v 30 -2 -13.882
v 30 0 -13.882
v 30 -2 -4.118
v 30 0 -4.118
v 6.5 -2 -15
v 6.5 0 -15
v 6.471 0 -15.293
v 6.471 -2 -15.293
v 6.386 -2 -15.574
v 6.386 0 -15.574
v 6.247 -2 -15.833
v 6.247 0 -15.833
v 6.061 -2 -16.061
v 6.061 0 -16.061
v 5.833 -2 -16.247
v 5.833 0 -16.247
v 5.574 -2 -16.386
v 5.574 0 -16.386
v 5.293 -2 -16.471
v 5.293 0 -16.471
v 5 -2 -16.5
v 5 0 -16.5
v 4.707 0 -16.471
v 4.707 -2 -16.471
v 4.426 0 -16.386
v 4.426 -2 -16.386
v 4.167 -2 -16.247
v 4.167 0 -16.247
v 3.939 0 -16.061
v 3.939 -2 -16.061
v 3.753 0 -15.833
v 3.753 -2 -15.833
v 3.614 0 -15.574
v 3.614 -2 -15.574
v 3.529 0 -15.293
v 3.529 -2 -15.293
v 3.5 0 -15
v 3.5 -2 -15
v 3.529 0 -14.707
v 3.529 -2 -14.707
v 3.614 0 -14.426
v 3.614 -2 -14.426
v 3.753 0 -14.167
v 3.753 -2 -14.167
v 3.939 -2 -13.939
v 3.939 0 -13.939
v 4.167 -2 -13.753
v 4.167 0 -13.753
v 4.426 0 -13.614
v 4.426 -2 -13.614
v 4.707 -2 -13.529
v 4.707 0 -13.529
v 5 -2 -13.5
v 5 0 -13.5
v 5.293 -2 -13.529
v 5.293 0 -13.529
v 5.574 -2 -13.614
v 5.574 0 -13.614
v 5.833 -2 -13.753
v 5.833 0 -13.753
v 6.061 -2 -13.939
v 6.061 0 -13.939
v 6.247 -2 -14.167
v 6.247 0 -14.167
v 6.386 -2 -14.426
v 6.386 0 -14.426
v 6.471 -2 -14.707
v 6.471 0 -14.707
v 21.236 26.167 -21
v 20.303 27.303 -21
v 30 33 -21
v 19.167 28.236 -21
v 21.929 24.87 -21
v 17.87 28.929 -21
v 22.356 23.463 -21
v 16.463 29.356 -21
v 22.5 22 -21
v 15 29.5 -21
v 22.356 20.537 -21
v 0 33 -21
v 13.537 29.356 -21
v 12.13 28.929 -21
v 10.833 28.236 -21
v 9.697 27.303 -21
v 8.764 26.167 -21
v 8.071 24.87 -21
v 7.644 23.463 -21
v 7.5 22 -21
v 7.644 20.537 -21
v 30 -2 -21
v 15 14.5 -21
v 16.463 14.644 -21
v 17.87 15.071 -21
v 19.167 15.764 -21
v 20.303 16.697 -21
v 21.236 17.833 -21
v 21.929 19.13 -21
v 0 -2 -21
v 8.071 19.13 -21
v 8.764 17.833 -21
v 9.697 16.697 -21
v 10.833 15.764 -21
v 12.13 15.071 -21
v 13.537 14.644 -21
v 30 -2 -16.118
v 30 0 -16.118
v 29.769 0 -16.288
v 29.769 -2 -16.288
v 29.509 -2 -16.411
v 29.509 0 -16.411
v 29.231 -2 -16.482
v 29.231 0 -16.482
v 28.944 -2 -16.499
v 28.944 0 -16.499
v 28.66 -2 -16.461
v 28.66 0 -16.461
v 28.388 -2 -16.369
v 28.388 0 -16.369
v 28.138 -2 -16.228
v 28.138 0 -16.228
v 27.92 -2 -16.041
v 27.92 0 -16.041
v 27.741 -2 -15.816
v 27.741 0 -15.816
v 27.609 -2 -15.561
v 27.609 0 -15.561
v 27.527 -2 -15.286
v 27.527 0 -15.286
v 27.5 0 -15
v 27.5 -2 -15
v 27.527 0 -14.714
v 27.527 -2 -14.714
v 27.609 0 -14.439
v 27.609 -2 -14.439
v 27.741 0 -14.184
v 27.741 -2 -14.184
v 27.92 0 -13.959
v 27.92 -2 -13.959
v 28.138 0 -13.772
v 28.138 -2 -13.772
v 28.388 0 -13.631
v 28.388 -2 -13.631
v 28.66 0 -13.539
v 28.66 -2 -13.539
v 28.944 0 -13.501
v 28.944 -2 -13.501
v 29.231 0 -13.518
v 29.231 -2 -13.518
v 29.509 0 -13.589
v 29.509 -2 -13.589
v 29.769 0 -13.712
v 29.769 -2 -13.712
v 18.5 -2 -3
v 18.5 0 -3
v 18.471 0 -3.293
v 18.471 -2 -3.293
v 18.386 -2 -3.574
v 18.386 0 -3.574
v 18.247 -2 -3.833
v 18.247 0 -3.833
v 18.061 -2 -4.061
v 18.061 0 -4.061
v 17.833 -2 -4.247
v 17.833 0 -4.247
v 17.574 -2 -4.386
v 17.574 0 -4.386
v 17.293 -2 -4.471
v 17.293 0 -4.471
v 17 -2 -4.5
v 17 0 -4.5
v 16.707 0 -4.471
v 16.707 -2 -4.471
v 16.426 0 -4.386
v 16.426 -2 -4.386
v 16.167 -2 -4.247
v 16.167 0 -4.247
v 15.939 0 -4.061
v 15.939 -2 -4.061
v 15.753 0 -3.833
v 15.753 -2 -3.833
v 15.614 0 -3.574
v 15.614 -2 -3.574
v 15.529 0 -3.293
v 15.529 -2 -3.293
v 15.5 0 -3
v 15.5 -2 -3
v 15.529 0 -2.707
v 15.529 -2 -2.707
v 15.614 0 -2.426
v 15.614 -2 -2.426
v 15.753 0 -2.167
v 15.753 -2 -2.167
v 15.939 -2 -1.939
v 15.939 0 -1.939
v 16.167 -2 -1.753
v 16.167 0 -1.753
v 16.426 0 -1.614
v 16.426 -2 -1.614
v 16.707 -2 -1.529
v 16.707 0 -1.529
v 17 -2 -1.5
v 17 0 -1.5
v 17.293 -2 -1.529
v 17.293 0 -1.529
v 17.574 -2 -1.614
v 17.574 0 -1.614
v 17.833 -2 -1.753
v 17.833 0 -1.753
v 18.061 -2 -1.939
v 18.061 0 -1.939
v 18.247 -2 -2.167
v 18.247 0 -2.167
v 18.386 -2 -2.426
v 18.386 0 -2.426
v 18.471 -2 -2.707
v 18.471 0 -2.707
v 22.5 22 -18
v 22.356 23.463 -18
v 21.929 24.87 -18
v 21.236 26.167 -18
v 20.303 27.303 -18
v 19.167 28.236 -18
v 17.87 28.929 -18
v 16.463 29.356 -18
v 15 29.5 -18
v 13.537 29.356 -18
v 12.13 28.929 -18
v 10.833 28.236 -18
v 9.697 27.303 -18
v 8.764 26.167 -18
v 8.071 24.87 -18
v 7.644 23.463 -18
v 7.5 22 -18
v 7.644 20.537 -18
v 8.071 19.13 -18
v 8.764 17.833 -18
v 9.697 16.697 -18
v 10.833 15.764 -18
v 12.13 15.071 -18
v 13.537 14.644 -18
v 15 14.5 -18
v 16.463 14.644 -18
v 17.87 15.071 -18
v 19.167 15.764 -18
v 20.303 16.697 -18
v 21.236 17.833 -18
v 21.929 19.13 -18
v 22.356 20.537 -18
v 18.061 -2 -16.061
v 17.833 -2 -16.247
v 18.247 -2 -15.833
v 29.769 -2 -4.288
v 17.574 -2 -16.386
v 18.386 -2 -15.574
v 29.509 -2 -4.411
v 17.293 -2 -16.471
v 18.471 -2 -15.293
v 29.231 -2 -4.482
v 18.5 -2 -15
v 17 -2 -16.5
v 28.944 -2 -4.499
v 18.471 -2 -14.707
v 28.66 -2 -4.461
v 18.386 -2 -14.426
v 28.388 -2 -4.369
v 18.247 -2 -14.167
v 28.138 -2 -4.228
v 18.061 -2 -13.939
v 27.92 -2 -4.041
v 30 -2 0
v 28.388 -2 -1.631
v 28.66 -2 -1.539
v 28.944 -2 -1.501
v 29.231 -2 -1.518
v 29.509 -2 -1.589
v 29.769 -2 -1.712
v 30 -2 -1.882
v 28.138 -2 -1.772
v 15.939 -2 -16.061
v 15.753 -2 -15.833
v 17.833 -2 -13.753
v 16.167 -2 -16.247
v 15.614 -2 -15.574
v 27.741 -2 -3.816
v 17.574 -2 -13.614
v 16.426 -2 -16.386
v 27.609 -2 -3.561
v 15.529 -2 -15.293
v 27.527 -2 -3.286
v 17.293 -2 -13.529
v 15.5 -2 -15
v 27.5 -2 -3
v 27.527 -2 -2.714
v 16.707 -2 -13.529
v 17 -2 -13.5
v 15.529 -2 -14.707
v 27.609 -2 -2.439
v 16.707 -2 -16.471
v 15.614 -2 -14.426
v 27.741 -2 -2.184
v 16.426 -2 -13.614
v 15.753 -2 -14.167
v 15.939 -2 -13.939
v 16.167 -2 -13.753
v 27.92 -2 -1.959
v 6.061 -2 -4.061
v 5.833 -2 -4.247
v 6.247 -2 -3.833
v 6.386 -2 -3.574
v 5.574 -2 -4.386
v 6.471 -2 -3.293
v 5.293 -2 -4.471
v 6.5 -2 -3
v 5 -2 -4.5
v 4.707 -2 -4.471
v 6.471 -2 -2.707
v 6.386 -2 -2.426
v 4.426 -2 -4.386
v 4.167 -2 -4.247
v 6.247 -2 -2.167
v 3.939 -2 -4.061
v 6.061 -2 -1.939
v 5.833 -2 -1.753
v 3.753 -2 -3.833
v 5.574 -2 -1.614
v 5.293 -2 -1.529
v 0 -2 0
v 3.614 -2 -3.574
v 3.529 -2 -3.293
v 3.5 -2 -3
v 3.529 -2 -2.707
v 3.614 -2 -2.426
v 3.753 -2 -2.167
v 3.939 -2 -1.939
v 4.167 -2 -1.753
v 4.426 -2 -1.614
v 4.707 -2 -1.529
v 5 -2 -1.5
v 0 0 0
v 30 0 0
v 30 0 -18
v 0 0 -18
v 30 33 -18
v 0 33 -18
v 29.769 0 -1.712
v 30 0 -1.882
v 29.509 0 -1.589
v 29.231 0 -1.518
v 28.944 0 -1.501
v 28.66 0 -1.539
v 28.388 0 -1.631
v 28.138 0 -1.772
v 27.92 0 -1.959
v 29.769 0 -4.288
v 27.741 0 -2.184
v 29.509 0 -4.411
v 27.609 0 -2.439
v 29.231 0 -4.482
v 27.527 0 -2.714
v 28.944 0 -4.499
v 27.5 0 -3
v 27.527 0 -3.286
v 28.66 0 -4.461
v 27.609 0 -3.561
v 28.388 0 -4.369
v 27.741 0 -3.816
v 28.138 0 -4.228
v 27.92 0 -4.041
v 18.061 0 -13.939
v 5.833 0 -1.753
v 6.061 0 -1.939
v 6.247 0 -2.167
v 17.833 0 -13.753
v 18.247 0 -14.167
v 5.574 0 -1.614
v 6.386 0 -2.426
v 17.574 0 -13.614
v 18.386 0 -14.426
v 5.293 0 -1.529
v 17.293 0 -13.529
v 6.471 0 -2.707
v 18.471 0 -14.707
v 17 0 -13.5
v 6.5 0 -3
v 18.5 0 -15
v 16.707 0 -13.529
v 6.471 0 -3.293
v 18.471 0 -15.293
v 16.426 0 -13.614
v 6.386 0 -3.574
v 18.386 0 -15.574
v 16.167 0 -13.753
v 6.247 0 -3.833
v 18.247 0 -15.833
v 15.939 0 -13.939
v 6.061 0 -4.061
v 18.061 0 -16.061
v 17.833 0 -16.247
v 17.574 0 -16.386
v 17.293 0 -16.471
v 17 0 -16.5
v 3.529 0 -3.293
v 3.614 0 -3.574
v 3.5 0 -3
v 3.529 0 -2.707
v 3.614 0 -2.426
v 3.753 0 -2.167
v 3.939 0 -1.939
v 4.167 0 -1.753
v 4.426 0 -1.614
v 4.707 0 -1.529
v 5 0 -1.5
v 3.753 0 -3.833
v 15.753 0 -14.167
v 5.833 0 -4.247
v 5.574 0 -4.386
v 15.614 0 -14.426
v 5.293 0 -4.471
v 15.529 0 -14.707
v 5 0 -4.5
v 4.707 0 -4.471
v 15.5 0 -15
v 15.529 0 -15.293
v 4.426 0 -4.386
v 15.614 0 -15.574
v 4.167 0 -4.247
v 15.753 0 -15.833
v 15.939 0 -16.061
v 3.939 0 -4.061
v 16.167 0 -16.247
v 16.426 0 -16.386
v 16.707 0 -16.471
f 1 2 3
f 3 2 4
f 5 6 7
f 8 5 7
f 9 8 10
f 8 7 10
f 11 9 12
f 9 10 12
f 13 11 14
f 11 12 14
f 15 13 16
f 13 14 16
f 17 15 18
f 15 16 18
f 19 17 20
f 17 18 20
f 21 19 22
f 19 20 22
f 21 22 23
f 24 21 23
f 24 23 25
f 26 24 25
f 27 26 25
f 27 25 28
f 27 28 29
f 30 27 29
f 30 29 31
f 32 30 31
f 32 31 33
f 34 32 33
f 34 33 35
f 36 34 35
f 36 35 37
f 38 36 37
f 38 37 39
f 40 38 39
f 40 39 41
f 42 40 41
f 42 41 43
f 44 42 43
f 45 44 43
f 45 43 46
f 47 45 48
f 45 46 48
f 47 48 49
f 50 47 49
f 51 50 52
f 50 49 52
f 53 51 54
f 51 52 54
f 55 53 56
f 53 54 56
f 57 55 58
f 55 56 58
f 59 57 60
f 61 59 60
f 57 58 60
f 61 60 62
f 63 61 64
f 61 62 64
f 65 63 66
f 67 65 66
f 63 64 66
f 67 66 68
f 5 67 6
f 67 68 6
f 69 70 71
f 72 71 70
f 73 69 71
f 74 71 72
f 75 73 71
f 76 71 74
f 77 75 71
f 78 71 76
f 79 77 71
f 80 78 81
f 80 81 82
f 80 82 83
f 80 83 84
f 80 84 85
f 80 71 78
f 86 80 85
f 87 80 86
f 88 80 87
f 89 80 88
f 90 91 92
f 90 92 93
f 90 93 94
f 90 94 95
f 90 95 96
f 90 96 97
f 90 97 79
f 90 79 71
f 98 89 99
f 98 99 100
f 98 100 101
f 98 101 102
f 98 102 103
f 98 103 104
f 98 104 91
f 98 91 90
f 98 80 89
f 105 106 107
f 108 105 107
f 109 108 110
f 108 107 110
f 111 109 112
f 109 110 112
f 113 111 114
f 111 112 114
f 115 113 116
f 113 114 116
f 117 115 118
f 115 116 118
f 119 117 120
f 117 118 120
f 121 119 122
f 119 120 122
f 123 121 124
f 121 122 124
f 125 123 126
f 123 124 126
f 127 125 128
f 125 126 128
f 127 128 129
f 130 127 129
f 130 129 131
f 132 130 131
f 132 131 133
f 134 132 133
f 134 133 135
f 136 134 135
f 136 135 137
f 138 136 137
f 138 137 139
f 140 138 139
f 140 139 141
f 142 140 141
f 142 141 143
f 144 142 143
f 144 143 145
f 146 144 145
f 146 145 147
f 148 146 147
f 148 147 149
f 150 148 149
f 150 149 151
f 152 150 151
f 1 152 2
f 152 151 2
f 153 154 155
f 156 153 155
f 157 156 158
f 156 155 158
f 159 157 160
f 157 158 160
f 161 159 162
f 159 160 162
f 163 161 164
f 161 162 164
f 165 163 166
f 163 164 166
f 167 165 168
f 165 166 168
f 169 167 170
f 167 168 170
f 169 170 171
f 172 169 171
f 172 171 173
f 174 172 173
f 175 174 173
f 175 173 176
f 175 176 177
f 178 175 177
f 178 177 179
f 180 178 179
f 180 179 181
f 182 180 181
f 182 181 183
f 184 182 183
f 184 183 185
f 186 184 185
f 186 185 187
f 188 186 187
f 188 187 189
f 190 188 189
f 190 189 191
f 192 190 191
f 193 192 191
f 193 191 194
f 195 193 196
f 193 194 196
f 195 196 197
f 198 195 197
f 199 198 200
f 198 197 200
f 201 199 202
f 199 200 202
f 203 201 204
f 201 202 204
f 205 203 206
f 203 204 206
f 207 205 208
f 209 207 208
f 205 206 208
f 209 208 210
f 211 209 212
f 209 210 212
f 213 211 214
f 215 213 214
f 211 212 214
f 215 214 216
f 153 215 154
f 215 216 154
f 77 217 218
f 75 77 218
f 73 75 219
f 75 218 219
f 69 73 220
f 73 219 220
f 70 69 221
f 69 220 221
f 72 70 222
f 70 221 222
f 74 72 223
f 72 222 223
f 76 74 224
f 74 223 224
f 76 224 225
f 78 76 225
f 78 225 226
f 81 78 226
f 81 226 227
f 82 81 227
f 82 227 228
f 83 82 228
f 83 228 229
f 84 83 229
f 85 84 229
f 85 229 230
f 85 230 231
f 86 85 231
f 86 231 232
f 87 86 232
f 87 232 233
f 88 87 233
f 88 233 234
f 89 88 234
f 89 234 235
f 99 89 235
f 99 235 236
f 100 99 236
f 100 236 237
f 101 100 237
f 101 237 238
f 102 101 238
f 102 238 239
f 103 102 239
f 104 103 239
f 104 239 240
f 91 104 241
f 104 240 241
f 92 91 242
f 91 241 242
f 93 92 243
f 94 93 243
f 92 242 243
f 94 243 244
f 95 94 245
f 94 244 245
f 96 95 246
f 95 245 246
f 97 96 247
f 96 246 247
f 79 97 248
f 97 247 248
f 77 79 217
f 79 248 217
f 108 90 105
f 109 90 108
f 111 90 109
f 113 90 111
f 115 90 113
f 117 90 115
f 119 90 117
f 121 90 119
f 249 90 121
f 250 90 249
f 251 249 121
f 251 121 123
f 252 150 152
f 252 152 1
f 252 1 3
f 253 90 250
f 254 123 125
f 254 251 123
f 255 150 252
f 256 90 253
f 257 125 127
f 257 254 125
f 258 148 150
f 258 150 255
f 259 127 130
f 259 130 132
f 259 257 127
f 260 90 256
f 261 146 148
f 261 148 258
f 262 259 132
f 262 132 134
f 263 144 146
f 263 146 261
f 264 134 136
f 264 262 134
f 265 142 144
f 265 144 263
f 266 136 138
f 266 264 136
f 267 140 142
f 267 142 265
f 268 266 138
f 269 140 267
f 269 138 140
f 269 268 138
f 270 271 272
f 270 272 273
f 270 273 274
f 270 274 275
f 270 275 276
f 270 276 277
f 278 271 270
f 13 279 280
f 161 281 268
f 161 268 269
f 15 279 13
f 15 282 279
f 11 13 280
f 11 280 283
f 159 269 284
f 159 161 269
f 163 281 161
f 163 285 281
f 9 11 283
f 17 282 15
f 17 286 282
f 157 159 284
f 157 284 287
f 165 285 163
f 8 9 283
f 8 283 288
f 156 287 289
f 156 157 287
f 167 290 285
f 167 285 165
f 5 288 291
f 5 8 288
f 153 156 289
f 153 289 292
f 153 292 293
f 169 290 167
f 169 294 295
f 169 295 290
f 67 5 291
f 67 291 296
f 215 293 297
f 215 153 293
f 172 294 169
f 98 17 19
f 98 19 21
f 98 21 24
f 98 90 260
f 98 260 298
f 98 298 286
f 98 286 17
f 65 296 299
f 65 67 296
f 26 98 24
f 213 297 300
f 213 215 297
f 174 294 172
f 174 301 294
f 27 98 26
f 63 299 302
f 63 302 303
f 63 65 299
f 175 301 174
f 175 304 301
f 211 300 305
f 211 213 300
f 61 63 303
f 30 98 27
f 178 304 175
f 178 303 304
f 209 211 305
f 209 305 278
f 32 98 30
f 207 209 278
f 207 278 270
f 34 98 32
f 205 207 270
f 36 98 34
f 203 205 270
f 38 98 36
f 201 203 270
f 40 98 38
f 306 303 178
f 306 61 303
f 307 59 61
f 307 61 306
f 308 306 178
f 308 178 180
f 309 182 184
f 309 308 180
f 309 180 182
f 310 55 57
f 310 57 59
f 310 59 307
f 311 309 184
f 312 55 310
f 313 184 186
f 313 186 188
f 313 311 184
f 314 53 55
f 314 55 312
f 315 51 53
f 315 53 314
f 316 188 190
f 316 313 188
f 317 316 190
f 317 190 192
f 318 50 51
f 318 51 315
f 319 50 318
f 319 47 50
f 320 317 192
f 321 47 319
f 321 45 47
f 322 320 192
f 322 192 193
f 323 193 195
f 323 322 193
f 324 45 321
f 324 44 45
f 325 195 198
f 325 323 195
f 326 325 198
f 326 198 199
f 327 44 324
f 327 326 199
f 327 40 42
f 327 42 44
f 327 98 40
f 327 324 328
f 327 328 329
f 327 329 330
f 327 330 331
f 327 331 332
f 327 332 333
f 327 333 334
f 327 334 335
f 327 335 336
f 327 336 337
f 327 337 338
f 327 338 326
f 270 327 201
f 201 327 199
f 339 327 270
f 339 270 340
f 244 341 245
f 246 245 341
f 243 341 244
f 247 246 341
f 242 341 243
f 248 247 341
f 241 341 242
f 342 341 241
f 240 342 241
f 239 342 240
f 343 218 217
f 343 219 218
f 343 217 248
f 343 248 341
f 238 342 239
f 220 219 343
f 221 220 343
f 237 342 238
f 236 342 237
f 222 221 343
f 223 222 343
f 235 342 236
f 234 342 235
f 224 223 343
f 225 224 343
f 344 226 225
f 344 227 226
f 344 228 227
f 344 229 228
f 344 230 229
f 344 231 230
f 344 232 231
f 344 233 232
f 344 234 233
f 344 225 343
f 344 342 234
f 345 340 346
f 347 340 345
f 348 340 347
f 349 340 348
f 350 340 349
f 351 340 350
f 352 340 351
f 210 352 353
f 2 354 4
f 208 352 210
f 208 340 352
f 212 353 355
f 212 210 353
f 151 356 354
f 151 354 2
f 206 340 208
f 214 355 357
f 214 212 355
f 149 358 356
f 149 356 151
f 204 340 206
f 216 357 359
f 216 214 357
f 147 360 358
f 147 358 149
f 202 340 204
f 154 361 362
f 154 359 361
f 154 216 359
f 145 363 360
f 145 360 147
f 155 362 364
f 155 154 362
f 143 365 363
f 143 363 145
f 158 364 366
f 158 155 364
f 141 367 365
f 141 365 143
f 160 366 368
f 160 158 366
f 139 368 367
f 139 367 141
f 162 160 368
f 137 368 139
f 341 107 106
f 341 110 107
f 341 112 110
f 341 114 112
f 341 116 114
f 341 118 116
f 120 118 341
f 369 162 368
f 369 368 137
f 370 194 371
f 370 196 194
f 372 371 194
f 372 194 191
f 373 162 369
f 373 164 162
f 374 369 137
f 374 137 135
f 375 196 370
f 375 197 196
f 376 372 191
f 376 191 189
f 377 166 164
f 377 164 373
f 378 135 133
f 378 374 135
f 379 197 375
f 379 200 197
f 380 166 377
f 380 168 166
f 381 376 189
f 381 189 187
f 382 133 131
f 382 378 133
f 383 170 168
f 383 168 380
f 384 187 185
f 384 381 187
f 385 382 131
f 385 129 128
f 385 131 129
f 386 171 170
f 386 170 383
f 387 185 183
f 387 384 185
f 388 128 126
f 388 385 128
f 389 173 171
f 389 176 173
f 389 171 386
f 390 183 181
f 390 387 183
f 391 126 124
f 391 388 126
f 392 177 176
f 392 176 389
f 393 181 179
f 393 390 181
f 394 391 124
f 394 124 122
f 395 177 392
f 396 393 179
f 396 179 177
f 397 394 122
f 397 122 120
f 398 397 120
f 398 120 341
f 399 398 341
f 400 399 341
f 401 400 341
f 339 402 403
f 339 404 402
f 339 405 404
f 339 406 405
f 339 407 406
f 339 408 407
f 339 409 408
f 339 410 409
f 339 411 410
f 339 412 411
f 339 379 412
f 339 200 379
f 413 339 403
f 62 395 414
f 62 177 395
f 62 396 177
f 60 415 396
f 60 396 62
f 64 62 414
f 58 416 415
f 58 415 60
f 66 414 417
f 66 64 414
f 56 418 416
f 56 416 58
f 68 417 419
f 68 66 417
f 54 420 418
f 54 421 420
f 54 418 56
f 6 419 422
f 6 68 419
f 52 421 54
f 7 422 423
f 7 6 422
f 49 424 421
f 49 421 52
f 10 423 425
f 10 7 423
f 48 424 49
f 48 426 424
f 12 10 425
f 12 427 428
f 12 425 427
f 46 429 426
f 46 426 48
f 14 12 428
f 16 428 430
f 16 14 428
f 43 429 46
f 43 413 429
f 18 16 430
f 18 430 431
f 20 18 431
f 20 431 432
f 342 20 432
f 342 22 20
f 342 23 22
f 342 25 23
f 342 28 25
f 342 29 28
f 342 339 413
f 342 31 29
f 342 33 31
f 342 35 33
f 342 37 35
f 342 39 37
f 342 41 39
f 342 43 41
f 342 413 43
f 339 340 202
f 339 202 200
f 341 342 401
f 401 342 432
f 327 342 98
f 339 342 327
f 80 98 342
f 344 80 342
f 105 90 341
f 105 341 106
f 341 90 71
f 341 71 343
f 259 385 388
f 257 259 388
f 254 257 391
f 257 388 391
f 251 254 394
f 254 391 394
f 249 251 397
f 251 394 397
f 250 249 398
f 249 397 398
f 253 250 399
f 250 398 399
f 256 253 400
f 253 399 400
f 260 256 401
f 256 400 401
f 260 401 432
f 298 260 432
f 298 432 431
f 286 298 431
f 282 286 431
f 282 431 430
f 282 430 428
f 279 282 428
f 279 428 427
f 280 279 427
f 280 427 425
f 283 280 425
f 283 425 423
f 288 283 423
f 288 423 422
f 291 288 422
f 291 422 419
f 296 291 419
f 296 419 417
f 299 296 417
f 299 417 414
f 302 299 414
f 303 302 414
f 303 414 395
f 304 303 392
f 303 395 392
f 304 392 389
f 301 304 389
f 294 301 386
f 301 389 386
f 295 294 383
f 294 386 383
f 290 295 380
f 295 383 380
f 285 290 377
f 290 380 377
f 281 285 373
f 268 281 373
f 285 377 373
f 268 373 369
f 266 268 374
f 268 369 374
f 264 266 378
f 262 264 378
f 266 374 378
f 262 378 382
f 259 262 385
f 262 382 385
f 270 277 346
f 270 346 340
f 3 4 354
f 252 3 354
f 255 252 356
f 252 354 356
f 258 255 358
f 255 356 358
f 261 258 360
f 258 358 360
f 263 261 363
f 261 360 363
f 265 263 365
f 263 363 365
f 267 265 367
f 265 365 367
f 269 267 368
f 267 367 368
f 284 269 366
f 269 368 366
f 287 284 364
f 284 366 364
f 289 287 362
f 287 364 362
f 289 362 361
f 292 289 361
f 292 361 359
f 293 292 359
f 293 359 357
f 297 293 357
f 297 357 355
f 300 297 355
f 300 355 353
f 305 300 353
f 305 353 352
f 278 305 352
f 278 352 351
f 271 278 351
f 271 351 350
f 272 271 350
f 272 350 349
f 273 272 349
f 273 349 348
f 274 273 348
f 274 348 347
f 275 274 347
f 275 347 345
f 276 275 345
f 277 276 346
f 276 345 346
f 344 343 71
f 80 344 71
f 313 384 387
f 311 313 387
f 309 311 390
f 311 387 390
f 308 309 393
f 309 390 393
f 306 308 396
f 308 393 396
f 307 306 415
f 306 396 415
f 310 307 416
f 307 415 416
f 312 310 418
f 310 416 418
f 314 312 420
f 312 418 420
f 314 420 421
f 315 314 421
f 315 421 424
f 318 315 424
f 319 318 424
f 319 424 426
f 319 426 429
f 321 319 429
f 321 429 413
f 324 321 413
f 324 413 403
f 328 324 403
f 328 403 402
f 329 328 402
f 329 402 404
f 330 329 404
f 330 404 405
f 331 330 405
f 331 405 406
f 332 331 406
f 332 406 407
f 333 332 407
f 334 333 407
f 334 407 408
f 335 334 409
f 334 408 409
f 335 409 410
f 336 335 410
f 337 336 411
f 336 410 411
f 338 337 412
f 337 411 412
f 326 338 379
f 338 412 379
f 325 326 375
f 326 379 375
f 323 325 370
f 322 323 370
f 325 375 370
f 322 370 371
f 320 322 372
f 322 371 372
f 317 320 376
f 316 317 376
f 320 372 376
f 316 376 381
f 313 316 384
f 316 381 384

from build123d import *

# Parameters (mm, degrees)
BOSS_EXTRUDE1_DEPTH = 30
SKETCH2_R           = 7.5
CUT_EXTRUDE1_DEPTH  = 30
SKETCH5_R           = 1.5
CUT_EXTRUDE2_DEPTH  = 30


with BuildPart() as part:
    # Sketch1 → Boss-Extrude1 (new body)
    with BuildSketch(Plane(origin=(0, 0, 0), x_dir=(0, 0, -1), z_dir=(1, 0, 0))):
        Polygon((0, 0), (18, 0), (18, 33), (21, 33), (21, -2), (0, -2), align=None)
    extrude(amount=BOSS_EXTRUDE1_DEPTH)

    # Sketch2 → Cut-Extrude1 (cut)
    with BuildSketch(Plane.XY.offset(-18)):
        with Locations((15, 22)):
            Circle(SKETCH2_R)
    extrude(amount=-CUT_EXTRUDE1_DEPTH, mode=Mode.SUBTRACT)

    # Sketch5 → Cut-Extrude2 (cut)
    with BuildSketch(Plane(origin=(0, 0, 0), x_dir=(1, 0, 0), z_dir=(0, 1, 0))):
        with Locations((5, 3)):
            Circle(SKETCH5_R)
        with Locations((17, 3)):
            Circle(SKETCH5_R)
        with Locations((29, 3)):
            Circle(SKETCH5_R)
        with Locations((17, 15)):
            Circle(SKETCH5_R)
        with Locations((29, 15)):
            Circle(SKETCH5_R)
        with Locations((5, 15)):
            Circle(SKETCH5_R)
    extrude(amount=-CUT_EXTRUDE2_DEPTH, mode=Mode.SUBTRACT)


solid = part.part
